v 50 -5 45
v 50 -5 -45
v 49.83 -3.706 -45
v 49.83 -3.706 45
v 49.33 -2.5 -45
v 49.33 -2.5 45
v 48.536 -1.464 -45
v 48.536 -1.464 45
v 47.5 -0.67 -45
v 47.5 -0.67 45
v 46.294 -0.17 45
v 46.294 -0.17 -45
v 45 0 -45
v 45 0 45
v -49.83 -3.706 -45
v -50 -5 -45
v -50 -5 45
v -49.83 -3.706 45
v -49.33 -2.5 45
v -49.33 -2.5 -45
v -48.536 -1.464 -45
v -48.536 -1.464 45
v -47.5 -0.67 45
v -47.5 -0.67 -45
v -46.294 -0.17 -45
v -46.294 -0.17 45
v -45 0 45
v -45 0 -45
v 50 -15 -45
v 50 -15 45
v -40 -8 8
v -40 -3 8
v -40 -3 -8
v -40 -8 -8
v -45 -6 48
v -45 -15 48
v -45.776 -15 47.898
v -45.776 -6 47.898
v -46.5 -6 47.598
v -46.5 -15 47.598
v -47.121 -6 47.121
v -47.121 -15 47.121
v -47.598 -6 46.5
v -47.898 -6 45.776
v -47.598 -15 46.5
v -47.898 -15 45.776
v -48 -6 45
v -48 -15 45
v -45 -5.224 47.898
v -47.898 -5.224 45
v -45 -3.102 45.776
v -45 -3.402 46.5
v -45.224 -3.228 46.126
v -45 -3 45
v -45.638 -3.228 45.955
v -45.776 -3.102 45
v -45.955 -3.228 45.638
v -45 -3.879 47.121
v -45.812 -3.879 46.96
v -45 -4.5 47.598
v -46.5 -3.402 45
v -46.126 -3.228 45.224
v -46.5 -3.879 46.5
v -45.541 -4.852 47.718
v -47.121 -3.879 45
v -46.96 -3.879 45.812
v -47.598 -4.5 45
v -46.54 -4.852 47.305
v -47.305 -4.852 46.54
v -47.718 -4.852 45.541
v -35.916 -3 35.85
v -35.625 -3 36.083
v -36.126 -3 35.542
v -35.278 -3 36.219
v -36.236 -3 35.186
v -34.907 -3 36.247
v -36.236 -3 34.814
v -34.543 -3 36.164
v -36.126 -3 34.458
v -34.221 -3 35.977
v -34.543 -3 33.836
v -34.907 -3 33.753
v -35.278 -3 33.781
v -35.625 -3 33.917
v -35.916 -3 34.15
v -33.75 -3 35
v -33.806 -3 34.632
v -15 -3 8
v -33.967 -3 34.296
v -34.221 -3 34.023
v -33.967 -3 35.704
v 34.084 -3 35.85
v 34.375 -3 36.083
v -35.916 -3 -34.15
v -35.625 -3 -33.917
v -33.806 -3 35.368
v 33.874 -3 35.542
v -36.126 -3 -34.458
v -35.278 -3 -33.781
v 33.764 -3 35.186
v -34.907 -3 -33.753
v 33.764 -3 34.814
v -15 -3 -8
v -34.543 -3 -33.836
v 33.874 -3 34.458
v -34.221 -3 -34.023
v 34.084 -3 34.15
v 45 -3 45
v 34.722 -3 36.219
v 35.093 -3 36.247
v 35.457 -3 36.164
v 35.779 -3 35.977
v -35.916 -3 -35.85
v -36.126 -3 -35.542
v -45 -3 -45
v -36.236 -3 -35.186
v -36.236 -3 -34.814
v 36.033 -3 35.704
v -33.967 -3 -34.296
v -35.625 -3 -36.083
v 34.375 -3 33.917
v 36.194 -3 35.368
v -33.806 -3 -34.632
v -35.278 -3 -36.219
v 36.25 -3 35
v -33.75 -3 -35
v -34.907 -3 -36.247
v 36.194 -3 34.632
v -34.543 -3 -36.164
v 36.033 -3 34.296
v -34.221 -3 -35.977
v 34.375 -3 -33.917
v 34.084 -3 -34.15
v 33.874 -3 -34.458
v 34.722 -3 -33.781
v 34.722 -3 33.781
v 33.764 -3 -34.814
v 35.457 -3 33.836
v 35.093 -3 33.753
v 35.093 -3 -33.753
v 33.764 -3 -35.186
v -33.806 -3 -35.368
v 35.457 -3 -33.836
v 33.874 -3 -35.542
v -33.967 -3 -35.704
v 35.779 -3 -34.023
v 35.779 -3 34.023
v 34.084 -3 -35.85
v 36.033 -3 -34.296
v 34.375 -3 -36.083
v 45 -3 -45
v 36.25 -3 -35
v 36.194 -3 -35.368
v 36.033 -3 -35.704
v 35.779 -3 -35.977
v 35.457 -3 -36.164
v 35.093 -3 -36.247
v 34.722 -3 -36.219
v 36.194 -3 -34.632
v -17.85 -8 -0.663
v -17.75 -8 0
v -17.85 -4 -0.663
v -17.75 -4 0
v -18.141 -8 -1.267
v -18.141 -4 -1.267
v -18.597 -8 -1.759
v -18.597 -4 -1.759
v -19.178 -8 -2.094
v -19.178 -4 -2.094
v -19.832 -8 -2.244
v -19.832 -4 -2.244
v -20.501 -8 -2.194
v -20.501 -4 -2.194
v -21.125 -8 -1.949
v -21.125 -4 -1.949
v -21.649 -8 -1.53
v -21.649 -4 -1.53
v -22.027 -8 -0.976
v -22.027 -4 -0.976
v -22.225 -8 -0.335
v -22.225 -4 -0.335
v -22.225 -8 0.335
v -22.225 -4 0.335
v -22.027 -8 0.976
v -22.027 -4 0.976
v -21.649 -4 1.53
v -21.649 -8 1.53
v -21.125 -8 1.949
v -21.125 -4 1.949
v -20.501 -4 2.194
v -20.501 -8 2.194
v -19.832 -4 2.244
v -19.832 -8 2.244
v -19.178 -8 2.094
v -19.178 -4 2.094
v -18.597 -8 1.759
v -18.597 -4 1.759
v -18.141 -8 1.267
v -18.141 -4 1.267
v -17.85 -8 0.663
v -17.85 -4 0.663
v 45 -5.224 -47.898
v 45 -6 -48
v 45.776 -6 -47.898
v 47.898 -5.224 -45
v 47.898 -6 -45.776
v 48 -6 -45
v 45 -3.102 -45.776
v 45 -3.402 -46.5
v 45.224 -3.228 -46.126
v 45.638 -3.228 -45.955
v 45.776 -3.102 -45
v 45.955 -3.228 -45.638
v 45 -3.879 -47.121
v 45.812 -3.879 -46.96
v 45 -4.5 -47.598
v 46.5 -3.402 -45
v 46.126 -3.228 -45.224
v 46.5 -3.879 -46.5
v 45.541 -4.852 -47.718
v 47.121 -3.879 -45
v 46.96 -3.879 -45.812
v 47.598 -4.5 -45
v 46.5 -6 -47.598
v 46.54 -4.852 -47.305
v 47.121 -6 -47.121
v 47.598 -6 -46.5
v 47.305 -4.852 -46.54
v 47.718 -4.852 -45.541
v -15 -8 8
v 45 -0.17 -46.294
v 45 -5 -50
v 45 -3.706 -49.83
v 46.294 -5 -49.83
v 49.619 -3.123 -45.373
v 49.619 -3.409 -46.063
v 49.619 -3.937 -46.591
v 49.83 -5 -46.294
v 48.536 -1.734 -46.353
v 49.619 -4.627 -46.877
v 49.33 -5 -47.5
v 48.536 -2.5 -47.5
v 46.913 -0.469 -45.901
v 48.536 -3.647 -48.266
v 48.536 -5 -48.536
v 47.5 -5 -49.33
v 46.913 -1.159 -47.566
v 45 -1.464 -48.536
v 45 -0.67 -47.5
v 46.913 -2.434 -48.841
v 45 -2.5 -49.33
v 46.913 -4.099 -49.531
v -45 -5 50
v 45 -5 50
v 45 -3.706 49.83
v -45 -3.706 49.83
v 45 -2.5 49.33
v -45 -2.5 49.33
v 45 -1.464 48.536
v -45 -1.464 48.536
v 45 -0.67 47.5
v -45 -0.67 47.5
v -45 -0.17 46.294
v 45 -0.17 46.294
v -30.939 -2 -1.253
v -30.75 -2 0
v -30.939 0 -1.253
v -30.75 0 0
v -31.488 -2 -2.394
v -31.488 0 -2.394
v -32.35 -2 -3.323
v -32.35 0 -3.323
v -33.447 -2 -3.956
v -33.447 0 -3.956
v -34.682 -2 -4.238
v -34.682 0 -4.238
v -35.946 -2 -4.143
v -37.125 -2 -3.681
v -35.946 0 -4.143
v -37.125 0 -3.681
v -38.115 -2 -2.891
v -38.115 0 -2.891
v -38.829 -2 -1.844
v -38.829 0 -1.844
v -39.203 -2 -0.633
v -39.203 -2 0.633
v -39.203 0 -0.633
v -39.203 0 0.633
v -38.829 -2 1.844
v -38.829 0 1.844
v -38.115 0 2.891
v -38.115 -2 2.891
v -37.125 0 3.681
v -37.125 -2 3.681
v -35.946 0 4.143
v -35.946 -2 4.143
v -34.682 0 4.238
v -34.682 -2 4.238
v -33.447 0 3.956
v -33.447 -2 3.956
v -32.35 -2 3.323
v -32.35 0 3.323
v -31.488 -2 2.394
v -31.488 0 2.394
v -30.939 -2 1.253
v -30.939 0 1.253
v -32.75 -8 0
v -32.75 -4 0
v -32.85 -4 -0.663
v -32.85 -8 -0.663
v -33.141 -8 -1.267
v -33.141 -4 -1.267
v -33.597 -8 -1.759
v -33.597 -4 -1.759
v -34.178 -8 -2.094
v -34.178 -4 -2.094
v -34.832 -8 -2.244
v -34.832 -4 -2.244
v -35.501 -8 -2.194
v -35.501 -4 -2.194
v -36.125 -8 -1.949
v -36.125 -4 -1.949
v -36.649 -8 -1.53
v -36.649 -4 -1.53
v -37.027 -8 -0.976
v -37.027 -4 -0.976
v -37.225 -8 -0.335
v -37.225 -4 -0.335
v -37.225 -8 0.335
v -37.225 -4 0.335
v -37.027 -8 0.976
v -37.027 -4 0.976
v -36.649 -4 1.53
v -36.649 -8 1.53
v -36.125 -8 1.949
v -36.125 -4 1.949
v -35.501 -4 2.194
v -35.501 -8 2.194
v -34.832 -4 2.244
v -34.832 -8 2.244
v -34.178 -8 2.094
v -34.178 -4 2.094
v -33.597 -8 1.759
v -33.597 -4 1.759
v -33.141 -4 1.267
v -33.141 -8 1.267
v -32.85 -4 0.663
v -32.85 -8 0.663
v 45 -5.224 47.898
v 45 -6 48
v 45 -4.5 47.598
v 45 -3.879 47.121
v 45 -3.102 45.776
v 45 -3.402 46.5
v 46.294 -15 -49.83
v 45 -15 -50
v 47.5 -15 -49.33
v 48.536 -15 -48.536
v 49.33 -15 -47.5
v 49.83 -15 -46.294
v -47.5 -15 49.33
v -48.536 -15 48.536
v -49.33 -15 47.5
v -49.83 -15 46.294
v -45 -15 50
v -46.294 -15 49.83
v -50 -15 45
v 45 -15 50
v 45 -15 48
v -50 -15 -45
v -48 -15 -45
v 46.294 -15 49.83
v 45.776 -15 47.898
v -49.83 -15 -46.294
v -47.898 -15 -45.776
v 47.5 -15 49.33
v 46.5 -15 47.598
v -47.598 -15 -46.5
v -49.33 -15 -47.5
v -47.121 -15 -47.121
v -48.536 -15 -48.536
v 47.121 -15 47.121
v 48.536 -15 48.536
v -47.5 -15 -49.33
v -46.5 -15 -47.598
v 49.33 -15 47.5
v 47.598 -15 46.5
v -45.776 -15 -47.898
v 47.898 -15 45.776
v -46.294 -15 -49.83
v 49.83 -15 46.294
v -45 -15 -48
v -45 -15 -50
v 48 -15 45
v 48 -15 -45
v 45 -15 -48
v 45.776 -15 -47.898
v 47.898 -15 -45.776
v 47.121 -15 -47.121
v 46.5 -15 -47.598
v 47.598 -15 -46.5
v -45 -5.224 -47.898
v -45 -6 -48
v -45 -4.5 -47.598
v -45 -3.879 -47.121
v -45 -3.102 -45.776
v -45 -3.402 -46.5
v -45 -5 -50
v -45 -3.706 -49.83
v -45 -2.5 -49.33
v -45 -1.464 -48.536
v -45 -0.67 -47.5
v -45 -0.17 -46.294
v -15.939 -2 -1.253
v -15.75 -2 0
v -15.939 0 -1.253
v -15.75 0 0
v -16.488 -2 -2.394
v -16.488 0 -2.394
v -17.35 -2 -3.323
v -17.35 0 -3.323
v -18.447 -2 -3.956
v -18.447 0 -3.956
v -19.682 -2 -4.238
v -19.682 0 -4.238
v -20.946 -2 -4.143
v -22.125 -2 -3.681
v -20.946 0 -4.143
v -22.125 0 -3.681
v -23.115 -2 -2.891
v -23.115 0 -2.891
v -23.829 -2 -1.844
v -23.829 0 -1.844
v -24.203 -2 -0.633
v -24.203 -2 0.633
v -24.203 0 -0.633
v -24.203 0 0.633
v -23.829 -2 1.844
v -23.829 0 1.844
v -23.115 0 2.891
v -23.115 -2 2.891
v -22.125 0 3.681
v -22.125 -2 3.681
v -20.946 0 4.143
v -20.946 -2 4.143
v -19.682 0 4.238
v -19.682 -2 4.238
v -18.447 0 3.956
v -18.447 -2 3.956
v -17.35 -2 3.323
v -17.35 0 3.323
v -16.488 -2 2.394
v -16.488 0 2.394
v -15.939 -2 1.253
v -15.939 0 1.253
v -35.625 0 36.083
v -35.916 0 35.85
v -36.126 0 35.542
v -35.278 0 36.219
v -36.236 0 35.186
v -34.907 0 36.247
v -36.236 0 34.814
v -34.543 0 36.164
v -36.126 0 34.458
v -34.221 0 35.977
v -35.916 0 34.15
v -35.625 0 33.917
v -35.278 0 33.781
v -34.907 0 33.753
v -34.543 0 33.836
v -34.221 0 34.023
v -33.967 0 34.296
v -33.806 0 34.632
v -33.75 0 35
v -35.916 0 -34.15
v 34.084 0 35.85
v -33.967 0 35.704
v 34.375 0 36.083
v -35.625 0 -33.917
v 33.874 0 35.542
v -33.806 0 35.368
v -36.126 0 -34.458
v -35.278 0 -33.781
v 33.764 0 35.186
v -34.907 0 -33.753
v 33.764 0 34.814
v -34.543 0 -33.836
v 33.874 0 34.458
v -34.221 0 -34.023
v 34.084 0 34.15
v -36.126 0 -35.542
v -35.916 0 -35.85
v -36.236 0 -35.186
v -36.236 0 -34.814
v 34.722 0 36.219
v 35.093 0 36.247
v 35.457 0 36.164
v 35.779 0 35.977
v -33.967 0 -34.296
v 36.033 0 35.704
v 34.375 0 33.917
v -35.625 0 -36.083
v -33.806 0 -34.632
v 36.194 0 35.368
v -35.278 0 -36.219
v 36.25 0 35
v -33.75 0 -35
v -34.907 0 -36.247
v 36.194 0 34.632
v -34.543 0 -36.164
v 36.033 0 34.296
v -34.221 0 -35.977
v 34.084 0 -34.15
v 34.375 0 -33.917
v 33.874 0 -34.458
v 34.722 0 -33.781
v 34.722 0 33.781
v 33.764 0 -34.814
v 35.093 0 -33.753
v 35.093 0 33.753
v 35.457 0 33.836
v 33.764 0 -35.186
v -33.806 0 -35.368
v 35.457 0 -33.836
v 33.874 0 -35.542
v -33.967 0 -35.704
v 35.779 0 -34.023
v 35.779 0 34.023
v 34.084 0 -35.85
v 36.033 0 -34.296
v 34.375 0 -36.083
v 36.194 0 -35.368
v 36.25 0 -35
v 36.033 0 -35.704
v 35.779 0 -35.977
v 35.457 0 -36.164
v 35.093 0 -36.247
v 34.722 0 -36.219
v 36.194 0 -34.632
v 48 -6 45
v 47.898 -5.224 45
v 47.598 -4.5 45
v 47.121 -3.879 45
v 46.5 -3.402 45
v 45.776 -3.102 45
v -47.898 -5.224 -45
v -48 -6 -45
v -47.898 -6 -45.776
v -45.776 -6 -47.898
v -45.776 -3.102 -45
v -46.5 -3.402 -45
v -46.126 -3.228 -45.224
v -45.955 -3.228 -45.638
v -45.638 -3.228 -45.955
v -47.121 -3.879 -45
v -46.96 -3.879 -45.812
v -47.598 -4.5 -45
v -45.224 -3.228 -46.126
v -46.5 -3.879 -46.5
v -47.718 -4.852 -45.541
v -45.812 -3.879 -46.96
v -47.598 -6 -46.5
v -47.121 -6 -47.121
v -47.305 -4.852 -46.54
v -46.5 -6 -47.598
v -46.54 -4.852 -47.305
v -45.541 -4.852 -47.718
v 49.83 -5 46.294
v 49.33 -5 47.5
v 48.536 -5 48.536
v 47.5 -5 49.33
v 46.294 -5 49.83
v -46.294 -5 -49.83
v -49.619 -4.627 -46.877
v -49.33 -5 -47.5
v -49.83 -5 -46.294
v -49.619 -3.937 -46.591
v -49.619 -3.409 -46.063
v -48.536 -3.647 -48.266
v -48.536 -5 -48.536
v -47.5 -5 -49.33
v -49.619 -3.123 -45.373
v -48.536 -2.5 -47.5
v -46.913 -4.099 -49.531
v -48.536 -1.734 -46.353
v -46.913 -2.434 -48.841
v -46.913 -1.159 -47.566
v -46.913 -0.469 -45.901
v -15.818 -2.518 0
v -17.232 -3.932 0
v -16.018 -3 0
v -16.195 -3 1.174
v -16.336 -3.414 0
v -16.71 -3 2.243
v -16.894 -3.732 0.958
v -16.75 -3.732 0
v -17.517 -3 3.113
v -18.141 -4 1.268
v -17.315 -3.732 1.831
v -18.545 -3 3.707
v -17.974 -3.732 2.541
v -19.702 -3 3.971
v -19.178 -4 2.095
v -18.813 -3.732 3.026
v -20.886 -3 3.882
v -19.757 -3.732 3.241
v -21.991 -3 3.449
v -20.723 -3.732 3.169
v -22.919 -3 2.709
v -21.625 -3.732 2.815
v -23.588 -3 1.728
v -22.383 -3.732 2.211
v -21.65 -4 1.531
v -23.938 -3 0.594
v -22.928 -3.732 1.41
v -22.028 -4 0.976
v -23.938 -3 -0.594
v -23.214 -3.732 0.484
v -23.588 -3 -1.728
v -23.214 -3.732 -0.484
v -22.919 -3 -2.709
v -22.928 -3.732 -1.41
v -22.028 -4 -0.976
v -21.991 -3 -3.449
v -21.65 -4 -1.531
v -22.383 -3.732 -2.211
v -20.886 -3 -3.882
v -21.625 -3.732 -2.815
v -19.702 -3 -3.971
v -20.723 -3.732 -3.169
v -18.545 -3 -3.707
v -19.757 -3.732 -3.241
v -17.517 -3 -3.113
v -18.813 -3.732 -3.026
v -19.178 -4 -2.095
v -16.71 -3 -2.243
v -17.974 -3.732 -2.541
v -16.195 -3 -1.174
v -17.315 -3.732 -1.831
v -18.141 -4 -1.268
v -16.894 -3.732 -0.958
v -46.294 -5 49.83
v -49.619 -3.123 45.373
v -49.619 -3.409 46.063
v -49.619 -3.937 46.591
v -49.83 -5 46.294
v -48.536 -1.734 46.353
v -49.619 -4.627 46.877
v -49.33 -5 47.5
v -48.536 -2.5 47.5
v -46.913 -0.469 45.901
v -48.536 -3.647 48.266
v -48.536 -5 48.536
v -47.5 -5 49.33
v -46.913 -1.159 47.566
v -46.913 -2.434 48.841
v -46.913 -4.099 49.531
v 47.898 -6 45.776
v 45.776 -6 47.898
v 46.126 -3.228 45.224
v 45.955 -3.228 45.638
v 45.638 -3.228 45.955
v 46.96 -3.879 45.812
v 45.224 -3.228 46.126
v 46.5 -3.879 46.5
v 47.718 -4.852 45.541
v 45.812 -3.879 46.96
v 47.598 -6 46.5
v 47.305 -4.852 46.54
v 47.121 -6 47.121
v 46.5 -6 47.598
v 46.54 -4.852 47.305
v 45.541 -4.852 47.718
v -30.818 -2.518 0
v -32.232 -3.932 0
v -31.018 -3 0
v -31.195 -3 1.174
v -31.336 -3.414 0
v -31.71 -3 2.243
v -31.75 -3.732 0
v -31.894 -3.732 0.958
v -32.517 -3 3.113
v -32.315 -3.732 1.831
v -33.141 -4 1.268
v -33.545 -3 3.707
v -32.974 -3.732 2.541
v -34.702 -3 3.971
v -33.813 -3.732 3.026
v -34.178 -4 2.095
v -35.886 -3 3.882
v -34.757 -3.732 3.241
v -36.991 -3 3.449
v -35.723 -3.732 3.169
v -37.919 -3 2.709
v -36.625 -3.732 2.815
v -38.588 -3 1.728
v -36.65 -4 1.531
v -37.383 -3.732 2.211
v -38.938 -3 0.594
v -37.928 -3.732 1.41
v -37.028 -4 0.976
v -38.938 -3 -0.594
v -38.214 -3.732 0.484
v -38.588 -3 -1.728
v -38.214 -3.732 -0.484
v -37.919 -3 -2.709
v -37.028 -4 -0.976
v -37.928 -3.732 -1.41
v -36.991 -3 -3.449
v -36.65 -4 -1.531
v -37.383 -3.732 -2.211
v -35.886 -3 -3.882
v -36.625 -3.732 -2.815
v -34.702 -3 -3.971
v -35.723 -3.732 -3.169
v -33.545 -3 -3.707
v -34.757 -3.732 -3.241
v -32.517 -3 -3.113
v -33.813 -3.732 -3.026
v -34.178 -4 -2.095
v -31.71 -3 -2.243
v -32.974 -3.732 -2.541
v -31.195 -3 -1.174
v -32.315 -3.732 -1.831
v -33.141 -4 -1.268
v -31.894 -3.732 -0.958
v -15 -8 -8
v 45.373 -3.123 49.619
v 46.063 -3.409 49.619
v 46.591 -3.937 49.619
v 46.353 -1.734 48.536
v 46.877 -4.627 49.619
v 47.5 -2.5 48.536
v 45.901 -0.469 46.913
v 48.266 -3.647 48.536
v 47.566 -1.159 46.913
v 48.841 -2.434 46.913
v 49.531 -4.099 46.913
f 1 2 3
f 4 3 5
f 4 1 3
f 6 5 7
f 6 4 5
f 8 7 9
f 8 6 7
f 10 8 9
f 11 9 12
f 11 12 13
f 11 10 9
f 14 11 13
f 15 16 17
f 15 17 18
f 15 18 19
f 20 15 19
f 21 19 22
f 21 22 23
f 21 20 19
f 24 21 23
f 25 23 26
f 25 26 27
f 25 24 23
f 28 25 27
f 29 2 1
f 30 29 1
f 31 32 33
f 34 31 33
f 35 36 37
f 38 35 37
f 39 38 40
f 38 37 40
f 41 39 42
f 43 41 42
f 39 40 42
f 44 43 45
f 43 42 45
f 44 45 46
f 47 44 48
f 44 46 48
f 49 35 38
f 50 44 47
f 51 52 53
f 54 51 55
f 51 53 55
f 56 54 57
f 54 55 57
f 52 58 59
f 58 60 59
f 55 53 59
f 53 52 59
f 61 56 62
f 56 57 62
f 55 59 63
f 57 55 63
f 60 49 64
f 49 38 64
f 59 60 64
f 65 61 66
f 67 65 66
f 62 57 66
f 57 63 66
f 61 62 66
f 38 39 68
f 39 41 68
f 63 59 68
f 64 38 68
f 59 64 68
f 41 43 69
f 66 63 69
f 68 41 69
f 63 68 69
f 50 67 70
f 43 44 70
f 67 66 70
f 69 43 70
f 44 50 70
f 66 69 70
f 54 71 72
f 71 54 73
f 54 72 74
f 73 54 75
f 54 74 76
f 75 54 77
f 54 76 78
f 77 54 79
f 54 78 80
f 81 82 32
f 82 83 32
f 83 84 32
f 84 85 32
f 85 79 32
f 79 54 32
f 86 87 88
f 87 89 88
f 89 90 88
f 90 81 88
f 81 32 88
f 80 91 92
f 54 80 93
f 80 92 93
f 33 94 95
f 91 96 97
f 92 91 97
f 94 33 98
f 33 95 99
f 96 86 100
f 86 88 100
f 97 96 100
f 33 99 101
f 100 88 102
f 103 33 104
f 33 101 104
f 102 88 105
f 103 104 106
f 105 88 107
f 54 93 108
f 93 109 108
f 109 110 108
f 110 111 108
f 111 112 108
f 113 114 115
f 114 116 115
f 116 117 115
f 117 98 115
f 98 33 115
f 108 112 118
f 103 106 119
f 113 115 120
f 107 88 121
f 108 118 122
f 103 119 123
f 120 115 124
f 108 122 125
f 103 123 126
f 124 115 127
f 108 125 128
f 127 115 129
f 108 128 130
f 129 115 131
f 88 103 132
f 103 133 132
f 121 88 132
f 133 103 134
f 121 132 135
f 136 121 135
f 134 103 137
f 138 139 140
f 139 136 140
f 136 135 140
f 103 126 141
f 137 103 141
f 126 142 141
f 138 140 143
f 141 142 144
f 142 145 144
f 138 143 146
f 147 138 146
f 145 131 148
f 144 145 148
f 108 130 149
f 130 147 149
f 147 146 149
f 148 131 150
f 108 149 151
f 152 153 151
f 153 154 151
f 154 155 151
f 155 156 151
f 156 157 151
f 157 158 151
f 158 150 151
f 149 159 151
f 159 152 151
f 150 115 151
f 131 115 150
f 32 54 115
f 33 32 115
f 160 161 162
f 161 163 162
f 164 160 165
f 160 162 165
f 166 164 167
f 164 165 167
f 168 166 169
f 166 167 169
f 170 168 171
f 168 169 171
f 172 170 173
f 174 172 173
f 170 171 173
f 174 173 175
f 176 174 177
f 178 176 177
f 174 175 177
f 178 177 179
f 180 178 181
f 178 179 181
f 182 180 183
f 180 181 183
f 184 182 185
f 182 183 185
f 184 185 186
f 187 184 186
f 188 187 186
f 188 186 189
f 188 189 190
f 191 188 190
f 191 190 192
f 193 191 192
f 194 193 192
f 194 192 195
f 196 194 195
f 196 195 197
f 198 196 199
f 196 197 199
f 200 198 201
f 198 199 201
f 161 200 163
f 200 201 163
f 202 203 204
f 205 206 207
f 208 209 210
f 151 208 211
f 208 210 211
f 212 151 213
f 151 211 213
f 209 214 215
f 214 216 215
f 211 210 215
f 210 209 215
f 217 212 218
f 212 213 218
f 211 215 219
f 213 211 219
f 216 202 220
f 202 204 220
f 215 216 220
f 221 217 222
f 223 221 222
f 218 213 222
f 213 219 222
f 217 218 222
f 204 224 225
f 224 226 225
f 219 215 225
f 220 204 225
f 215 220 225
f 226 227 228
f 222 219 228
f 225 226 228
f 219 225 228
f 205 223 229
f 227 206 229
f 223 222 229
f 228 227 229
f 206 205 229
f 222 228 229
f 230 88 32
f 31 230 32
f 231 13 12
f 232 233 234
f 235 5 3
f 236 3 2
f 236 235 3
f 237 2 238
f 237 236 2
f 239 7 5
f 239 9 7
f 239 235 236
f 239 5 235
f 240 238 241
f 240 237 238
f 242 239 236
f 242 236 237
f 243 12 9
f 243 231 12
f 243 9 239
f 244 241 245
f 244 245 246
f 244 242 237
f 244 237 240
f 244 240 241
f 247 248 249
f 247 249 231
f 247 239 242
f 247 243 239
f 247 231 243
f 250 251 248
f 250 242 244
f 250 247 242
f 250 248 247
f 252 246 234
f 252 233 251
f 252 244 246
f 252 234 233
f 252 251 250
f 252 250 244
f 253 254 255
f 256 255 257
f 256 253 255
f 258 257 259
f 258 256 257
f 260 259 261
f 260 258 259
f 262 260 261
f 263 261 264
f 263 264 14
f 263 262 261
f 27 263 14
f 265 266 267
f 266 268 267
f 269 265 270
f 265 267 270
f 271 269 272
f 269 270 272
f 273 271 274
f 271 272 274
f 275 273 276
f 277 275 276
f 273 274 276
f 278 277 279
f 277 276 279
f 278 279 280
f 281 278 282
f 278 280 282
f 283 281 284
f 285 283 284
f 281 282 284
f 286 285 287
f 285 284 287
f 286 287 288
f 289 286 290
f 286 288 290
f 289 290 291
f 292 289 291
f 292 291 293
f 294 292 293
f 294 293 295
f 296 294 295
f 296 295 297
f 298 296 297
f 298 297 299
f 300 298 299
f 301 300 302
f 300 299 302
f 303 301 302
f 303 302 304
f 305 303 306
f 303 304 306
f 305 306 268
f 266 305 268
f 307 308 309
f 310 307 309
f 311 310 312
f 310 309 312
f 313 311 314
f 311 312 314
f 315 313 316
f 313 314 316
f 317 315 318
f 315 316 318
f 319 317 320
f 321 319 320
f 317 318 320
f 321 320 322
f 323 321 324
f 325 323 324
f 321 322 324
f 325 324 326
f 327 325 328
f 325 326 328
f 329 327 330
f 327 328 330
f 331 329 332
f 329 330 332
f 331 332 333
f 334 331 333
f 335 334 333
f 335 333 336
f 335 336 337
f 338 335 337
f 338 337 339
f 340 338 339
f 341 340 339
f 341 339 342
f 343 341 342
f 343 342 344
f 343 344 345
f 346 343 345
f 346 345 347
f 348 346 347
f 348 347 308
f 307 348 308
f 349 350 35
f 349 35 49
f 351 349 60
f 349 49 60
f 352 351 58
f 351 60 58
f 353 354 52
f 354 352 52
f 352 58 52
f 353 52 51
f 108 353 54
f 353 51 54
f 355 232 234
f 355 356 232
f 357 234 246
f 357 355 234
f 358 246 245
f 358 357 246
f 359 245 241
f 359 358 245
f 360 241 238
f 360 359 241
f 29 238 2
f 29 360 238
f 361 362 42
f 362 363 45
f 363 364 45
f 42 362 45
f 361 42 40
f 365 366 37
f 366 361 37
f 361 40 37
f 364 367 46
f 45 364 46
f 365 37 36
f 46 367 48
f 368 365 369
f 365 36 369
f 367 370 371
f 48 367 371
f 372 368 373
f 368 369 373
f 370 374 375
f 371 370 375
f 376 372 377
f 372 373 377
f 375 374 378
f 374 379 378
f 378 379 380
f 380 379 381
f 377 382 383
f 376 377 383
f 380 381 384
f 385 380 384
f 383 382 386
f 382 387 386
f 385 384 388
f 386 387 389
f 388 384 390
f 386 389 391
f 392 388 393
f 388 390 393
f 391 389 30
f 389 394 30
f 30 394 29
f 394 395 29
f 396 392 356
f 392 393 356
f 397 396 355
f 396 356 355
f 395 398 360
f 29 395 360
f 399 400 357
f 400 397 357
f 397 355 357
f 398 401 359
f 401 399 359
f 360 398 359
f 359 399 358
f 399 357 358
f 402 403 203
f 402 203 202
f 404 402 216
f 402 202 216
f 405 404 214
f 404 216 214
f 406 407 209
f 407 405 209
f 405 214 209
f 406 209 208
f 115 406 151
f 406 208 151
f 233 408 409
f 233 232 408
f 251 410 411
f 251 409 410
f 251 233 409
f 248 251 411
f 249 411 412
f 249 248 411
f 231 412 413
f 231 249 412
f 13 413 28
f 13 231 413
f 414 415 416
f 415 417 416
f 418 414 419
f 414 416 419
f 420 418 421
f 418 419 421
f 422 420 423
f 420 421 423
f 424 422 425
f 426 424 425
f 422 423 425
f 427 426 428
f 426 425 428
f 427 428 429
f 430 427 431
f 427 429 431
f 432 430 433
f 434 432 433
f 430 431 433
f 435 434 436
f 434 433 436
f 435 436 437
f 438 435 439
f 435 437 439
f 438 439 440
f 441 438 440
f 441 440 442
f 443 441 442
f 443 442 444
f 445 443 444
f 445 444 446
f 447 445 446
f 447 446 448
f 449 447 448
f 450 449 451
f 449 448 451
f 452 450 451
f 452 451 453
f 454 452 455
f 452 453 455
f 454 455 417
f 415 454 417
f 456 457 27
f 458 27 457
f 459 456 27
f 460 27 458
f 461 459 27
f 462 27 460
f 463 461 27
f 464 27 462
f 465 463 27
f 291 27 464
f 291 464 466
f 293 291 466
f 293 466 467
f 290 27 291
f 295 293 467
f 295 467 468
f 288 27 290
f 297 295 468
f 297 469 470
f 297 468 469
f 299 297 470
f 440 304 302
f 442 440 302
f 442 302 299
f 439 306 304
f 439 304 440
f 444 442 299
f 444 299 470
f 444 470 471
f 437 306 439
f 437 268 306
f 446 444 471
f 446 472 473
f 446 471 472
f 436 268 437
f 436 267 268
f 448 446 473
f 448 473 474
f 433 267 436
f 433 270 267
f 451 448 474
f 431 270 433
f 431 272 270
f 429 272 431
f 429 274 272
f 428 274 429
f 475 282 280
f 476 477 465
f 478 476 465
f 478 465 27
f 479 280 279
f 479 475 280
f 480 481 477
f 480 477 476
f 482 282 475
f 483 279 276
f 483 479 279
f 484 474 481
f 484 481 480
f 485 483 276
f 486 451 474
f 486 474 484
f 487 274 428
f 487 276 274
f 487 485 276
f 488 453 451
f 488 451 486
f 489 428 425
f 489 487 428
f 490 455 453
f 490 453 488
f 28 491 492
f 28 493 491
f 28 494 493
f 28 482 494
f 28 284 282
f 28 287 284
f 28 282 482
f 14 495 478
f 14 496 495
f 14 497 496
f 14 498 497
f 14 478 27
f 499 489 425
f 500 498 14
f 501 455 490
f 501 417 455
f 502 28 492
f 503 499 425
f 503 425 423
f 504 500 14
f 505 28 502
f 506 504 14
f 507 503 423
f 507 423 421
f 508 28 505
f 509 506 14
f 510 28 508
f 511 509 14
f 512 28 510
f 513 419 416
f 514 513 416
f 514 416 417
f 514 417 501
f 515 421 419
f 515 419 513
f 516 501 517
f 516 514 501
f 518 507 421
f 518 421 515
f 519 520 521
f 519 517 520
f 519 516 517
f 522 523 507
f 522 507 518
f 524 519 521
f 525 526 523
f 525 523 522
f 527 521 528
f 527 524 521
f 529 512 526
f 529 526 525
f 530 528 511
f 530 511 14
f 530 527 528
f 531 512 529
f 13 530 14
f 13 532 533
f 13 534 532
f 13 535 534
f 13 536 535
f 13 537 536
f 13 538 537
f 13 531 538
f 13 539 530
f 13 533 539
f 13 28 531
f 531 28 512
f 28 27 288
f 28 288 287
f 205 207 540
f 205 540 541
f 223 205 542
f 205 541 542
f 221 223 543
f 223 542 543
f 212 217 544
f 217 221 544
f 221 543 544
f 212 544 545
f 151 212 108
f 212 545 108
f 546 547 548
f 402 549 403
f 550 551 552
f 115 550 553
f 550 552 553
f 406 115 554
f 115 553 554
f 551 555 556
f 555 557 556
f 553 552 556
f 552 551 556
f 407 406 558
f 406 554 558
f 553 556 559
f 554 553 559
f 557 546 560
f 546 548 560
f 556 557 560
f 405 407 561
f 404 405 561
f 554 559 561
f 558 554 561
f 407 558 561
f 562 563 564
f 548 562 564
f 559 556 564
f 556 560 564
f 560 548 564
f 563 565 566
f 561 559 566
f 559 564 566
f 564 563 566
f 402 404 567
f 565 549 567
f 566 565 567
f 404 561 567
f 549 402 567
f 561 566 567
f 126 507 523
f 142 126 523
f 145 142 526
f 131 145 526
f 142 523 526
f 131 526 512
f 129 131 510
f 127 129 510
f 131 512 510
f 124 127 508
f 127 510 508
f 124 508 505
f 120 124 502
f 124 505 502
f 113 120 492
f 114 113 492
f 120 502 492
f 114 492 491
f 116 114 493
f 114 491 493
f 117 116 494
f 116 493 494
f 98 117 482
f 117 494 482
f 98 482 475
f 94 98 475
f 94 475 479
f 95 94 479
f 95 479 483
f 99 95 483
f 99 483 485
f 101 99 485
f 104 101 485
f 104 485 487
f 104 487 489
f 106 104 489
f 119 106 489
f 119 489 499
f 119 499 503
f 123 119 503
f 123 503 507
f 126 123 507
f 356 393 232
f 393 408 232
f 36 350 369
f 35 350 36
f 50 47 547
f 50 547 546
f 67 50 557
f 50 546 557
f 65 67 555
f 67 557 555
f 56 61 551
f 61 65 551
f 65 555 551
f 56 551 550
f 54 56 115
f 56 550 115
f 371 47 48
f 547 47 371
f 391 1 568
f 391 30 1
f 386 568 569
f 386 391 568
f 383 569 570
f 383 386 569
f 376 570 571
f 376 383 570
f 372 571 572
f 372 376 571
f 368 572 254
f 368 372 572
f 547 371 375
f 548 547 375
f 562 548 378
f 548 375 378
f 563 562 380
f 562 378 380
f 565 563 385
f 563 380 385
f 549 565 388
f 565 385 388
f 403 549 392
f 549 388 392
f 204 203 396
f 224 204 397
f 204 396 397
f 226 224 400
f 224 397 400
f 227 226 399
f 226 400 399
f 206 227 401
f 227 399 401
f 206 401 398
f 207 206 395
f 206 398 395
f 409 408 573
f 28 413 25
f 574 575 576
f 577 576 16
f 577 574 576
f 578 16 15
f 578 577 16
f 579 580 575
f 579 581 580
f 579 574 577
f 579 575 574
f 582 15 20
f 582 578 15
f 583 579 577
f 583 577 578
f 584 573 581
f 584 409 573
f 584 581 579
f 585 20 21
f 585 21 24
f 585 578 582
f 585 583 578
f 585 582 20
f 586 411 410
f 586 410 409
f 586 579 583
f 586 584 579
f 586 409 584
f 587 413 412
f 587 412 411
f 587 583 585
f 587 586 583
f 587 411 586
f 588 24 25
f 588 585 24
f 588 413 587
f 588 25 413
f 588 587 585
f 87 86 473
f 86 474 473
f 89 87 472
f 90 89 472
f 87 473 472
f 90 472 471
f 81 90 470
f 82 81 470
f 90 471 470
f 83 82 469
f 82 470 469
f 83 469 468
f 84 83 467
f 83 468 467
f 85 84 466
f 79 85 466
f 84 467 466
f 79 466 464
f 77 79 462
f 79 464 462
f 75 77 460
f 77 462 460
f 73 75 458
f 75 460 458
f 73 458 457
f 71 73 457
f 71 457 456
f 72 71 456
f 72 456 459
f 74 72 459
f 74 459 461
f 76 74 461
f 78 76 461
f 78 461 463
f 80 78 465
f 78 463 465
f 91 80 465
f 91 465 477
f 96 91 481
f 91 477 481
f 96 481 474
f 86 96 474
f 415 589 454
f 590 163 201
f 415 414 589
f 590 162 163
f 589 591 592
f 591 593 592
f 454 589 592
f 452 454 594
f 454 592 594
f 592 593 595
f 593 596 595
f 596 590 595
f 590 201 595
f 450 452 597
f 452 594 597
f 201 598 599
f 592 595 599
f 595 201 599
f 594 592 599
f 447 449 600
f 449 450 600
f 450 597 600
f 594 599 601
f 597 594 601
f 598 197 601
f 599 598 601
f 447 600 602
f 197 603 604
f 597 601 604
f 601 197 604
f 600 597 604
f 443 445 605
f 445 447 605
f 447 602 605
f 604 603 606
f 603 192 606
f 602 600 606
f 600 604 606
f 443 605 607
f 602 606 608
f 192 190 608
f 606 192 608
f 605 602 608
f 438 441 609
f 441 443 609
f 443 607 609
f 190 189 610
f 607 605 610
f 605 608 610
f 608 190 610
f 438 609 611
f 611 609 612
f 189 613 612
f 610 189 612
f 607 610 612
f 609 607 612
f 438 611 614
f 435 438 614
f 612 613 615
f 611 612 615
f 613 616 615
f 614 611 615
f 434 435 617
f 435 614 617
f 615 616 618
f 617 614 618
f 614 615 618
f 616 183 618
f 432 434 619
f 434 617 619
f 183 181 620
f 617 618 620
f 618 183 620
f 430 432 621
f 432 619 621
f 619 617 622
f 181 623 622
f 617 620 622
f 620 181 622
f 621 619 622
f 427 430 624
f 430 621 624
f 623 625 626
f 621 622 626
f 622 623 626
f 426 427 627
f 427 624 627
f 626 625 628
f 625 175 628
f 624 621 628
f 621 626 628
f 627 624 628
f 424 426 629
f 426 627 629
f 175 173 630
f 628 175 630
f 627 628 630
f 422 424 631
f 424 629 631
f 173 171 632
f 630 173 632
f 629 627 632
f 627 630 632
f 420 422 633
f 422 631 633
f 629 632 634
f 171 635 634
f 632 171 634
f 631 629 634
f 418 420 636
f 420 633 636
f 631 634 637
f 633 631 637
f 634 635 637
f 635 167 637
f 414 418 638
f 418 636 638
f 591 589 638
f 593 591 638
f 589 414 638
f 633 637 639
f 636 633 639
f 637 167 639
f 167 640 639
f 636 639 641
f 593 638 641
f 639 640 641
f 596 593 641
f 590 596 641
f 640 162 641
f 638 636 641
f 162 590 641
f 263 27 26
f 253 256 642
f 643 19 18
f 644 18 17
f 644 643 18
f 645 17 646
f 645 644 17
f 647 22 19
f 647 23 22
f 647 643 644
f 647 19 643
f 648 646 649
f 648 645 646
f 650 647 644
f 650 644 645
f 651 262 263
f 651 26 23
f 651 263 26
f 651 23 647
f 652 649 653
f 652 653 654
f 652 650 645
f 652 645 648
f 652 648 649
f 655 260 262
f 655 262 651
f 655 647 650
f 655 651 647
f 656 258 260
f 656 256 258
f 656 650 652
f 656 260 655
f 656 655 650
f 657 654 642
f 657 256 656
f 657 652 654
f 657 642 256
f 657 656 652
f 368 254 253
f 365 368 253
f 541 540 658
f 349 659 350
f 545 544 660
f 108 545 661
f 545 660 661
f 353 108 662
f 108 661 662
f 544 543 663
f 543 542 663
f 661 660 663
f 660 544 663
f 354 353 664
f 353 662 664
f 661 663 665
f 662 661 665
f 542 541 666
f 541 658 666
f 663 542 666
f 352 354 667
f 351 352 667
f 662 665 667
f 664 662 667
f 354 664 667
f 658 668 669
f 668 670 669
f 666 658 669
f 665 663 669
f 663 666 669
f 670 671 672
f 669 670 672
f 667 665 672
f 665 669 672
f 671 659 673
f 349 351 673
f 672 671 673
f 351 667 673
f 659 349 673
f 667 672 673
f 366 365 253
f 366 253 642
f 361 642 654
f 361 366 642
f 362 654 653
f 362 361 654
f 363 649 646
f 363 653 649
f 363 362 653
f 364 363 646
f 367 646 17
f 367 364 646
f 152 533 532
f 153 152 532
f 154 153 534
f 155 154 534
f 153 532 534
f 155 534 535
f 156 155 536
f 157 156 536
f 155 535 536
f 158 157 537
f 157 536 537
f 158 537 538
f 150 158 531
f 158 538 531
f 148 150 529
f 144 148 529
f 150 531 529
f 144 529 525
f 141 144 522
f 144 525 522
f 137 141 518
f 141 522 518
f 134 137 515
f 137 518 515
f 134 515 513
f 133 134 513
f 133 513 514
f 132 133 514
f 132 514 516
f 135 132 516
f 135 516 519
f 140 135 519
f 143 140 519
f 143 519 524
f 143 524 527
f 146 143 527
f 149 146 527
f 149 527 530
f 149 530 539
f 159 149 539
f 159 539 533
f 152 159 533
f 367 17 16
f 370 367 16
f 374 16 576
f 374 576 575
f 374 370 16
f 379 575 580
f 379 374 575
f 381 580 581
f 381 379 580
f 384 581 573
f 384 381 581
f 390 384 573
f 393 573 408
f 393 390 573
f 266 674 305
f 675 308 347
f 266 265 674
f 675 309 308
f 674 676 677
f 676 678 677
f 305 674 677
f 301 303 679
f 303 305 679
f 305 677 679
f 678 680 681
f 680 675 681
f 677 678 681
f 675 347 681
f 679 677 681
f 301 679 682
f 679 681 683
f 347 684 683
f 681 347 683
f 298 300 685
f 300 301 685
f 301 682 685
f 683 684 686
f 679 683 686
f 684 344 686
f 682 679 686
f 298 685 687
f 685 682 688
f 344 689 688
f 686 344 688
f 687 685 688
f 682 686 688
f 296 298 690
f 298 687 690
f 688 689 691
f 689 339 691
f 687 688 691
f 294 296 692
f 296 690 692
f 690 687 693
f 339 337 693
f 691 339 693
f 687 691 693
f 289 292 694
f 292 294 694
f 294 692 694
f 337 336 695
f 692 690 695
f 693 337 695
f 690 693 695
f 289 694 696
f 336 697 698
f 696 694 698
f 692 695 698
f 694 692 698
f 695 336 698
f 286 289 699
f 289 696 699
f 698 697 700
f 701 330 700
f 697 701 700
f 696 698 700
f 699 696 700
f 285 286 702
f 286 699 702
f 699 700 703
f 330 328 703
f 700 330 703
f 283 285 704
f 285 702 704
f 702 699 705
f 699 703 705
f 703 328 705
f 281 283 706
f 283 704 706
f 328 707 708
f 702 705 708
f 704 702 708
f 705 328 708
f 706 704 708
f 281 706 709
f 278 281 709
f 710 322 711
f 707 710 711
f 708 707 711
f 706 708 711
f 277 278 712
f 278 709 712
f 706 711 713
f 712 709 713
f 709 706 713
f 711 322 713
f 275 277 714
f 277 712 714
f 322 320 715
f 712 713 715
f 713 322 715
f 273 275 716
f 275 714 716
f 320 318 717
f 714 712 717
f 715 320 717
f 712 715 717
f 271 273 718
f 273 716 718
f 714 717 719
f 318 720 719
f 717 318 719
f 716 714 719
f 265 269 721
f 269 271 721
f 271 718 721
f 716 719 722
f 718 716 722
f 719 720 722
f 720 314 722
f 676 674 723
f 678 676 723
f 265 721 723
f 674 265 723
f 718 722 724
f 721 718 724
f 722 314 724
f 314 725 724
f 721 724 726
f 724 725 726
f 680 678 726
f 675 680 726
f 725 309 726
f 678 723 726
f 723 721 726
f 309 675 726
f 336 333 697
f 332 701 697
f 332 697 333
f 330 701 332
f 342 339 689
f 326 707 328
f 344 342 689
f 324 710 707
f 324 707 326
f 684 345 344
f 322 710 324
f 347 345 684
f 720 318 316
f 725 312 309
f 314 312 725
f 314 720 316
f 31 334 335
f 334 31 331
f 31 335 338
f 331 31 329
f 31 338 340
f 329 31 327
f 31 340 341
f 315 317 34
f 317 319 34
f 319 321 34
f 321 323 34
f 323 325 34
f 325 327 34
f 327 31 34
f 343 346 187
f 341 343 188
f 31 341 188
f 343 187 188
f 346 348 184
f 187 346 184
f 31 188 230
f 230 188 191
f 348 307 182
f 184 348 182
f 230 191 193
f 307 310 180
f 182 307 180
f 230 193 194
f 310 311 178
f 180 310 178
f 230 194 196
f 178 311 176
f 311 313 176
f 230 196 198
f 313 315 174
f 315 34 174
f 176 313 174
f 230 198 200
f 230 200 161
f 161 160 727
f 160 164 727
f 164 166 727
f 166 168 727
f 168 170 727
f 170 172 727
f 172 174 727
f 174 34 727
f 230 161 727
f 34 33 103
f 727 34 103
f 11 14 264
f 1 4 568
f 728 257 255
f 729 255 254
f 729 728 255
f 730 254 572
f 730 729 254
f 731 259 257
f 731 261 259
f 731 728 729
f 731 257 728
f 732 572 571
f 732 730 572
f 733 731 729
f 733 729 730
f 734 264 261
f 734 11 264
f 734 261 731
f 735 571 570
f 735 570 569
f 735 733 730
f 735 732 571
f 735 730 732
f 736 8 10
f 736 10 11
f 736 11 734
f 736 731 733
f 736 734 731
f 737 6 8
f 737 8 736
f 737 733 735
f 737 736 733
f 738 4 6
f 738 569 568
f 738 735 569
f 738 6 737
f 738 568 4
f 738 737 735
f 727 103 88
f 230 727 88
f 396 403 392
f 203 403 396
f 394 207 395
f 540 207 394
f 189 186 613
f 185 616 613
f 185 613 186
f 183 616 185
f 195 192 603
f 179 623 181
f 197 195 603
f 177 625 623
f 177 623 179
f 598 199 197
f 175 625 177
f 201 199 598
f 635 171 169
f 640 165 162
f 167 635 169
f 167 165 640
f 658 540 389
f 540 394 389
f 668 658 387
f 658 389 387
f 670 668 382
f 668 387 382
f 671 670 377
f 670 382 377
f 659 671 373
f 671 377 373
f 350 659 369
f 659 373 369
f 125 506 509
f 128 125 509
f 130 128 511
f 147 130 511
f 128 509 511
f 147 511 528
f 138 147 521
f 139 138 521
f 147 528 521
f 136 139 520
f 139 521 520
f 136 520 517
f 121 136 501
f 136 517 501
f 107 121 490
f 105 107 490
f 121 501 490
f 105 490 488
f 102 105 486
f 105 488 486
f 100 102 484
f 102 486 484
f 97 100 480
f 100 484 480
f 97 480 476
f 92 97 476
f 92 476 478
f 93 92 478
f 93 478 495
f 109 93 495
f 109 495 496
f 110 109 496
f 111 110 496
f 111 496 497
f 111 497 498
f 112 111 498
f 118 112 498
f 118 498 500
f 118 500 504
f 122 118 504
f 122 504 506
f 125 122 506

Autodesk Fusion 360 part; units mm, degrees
sketch "スケッチ1" plane through (0, 0, 0) normal (0, 1, 0) x (1, 0, 0)
  line L0 (-100, 0) -> (100, 0) construction
  line L1 (0, 100) -> (0, -100) construction
  line L2 (-40, 40) -> (40, 40)
  line L3 (40, 40) -> (40, -40)
  line L4 (40, -40) -> (-40, -40)
  line L5 (-40, -40) -> (-40, 40)
  line L6 (-40, 8) -> (-15, 8)
  line L7 (-15, 8) -> (-15, -8)
  line L8 (-15, -8) -> (-40, -8)
  line L9 (-40, -8) -> (-40, 8)
  circle A0 centre (-35, 0) radius 2.25
  circle A1 centre (-20, 0) radius 2.25
  circle A2 centre (0, 0) radius 35 construction
  circle A3 centre (0, 0) radius 40 construction
  circle A4 centre (-35, 35) radius 1.25
  circle A5 centre (35, 35) radius 1.25
  circle A6 centre (-35, -35) radius 1.25
  circle A7 centre (35, -35) radius 1.25
  circle A8 centre (-35, 0) radius 4.25
  circle A9 centre (-20, 0) radius 4.25
  line L10 (-50, 50) -> (50, 50)
  line L11 (50, 50) -> (50, -50)
  line L12 (50, -50) -> (-50, -50)
  line L13 (-50, -50) -> (-50, 50)
  line L14 (-48, 48) -> (48, 48)
  line L15 (48, 48) -> (48, -48)
  line L16 (48, -48) -> (-48, -48)
  line L17 (-48, -48) -> (-48, 48)
  dimension "d1" = 40
  dimension "d2" = 40
  dimension "d3" = 40
  dimension "d4" = 40
  dimension "d5" = 4.5
  dimension "d6" = 4.5
  dimension "d7" = 15
  dimension "d8" = 5
  dimension "d9" = 25
  dimension "d10" = 8
  dimension "d11" = 8
  dimension "d12" = 70
  dimension "d13" = 80
  dimension "d14" = 2.5
  dimension "d15" = 2.5
  dimension "d16" = 2.5
  dimension "d17" = 2.5
  dimension "d18" = 5
  dimension "d19" = 5
  dimension "d20" = 5
  dimension "d21" = 5
  dimension "d22" = 5
  dimension "d23" = 5
  dimension "d24" = 5
  dimension "d25" = 5
  dimension "d26" = 8.5
  dimension "d27" = 8.5
  dimension "d35" = 50
  dimension "d36" = 50
  dimension "d37" = 50
  dimension "d38" = 50
  dimension "d39" = 2
  dimension "d40" = 2
  dimension "d41" = 2
  dimension "d42" = 2
extrude "押し出し1" add sketch "スケッチ1" against normal blind 3 contours L2 L3 L4 L5 L6 L7 L8 | L14 L15 L16 L17
extrude "押し出し2" add sketch "スケッチ1" against normal blind 8 contours L5 L6 L7 L8 L9
extrude "押し出し3" add sketch "スケッチ1" against normal blind 4 from surface at -4 contours A8 | A9
fillet "フィレット1" radius 2 2 edges at (-38.9624, -4, -1.5369) (-23.9624, -4, -1.5369)
extrude "押し出し4" add sketch "スケッチ1" against normal blind 15 contours L10 L11 L12 L13
sketch "スケッチ2" plane through (0, 0, 0) normal (0, 0, 1) x (1, 0, 0)
fillet "フィレット2" radius 3 8 edges at (48, -9, 48) (48, -9, -48) (-48, -9, -48) (-48, -9, 48) (0, -3, -48) (48, -3, 0) (0, -3, 48) (-48, -3, 0)
fillet "フィレット3" radius 5 8 edges at (0, 0, -50) (50, -7.5, -50) (50, 0, 0) (50, -7.5, 50) (0, 0, 50) (-50, 0, 0) (-50, -7.5, 50) (-50, -7.5, -50)
